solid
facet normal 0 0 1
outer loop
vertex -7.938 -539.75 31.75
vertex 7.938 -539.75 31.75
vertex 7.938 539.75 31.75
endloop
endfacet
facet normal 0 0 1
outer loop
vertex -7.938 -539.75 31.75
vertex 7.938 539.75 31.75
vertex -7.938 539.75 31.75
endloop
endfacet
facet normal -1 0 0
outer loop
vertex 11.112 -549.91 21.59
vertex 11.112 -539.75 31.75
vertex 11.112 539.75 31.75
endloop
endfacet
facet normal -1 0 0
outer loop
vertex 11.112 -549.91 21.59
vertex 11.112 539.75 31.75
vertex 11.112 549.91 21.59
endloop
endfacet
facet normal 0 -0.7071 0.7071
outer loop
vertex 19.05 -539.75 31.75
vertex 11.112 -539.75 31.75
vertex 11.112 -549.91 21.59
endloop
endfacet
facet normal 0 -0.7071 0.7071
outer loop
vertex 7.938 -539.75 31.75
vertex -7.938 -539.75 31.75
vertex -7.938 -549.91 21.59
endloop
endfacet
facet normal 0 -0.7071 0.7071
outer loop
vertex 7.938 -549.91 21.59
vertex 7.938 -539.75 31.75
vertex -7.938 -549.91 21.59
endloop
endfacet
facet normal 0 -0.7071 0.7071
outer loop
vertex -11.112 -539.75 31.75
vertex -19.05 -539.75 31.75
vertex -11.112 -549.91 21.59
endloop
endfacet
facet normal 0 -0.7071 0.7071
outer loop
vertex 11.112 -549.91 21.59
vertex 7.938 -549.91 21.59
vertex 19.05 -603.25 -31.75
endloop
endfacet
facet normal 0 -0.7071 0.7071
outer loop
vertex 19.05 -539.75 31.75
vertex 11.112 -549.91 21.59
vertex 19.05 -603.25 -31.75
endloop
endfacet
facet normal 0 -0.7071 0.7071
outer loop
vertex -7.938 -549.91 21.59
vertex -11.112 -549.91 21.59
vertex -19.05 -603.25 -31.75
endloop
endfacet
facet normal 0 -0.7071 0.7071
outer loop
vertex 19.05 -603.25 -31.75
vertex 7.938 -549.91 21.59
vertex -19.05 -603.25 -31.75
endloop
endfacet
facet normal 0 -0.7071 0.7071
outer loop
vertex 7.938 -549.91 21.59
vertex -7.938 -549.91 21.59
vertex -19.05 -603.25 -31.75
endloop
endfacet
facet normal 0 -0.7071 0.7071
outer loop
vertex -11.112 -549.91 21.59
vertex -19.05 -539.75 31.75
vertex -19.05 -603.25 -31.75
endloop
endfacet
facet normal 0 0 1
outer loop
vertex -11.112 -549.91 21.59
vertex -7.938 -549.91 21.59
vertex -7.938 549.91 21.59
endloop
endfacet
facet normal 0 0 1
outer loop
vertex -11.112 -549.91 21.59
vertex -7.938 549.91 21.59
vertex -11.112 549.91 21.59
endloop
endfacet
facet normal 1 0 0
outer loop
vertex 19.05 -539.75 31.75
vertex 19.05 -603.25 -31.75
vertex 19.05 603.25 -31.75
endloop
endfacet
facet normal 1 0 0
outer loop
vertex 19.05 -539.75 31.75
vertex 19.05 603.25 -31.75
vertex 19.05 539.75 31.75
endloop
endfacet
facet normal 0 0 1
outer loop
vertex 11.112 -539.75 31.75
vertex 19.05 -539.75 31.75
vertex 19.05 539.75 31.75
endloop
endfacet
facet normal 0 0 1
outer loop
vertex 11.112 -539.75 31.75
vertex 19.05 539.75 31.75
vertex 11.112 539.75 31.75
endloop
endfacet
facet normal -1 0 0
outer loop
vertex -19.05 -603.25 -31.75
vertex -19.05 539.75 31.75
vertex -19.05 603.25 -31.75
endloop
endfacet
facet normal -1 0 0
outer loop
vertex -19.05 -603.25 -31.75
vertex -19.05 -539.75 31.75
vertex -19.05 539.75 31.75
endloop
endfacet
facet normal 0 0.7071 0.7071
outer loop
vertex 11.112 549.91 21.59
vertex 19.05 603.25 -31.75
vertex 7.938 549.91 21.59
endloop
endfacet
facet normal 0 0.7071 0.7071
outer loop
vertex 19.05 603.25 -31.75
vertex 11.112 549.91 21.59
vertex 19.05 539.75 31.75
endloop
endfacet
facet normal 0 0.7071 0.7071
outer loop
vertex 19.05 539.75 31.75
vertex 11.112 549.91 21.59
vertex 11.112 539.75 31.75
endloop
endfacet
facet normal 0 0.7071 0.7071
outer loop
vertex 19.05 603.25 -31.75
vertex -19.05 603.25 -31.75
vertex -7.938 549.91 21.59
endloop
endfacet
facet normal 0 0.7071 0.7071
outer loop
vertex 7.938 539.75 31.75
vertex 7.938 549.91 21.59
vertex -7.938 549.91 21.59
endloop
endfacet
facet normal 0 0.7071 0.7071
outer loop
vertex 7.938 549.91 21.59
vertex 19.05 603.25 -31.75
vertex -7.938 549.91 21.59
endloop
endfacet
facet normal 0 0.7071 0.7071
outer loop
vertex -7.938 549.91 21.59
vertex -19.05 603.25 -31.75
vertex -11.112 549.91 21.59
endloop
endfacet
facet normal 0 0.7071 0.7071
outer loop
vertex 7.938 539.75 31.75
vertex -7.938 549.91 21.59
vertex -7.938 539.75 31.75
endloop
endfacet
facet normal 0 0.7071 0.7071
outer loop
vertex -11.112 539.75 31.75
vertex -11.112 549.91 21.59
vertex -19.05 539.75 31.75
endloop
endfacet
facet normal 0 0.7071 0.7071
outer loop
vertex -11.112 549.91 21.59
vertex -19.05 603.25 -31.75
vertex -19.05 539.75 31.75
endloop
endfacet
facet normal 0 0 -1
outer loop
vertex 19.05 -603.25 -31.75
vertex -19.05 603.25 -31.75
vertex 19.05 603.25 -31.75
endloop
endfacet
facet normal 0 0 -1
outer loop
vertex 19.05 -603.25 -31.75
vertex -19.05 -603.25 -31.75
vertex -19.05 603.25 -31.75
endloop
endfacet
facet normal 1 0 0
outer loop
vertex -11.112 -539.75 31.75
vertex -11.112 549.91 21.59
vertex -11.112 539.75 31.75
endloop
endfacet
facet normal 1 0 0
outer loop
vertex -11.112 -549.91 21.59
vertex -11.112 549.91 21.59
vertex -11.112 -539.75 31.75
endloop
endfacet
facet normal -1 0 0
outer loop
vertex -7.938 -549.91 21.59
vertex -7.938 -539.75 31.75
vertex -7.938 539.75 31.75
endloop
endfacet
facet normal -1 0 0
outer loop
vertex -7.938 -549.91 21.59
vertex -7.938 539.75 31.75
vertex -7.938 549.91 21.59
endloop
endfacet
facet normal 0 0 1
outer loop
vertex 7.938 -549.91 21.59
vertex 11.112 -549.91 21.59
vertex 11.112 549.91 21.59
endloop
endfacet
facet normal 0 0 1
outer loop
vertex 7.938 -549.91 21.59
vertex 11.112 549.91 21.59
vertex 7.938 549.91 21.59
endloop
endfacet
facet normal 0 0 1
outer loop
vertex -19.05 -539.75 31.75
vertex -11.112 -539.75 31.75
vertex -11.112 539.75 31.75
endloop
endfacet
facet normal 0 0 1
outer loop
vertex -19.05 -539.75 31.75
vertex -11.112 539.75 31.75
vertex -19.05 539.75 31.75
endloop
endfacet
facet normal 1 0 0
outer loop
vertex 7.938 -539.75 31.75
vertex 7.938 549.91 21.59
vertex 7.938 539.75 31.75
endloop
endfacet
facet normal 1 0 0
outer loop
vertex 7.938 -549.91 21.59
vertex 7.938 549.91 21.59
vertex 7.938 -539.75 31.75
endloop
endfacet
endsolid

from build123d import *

# Parameters (mm, degrees)
F1_DEPTH = 603.25
F3_DEPTH = 38.101


with BuildPart() as f1:
    # F0 (on Front) → F1 (new body, symmetric)
    with BuildSketch(Plane.XZ):
        Polygon((-19.05, -31.75), (19.05, -31.75), (19.05, 31.75), (11.1125, 31.75), (11.1125, 21.59), (7.9375, 21.59), (7.9375, 31.75), (-7.9375, 31.75), (-7.9375, 21.59), (-11.1125, 21.59), (-11.1125, 31.75), (-19.05, 31.75), align=None)
    extrude(amount=F1_DEPTH, both=True)

    # F2 (on face) → F3 (cut, through all)
    with BuildSketch(Plane(origin=(-19.05, 0, 0), x_dir=(0, -1, 0), z_dir=(-1, 0, 0))):
        Polygon((539.75, 31.75), (603.25, -31.75), (603.25, 31.75), align=None)
        Polygon((-603.25, 31.75), (-603.25, -31.75), (-539.75, 31.75), align=None)
    extrude(amount=-F3_DEPTH, mode=Mode.SUBTRACT)


solid = f1.part
